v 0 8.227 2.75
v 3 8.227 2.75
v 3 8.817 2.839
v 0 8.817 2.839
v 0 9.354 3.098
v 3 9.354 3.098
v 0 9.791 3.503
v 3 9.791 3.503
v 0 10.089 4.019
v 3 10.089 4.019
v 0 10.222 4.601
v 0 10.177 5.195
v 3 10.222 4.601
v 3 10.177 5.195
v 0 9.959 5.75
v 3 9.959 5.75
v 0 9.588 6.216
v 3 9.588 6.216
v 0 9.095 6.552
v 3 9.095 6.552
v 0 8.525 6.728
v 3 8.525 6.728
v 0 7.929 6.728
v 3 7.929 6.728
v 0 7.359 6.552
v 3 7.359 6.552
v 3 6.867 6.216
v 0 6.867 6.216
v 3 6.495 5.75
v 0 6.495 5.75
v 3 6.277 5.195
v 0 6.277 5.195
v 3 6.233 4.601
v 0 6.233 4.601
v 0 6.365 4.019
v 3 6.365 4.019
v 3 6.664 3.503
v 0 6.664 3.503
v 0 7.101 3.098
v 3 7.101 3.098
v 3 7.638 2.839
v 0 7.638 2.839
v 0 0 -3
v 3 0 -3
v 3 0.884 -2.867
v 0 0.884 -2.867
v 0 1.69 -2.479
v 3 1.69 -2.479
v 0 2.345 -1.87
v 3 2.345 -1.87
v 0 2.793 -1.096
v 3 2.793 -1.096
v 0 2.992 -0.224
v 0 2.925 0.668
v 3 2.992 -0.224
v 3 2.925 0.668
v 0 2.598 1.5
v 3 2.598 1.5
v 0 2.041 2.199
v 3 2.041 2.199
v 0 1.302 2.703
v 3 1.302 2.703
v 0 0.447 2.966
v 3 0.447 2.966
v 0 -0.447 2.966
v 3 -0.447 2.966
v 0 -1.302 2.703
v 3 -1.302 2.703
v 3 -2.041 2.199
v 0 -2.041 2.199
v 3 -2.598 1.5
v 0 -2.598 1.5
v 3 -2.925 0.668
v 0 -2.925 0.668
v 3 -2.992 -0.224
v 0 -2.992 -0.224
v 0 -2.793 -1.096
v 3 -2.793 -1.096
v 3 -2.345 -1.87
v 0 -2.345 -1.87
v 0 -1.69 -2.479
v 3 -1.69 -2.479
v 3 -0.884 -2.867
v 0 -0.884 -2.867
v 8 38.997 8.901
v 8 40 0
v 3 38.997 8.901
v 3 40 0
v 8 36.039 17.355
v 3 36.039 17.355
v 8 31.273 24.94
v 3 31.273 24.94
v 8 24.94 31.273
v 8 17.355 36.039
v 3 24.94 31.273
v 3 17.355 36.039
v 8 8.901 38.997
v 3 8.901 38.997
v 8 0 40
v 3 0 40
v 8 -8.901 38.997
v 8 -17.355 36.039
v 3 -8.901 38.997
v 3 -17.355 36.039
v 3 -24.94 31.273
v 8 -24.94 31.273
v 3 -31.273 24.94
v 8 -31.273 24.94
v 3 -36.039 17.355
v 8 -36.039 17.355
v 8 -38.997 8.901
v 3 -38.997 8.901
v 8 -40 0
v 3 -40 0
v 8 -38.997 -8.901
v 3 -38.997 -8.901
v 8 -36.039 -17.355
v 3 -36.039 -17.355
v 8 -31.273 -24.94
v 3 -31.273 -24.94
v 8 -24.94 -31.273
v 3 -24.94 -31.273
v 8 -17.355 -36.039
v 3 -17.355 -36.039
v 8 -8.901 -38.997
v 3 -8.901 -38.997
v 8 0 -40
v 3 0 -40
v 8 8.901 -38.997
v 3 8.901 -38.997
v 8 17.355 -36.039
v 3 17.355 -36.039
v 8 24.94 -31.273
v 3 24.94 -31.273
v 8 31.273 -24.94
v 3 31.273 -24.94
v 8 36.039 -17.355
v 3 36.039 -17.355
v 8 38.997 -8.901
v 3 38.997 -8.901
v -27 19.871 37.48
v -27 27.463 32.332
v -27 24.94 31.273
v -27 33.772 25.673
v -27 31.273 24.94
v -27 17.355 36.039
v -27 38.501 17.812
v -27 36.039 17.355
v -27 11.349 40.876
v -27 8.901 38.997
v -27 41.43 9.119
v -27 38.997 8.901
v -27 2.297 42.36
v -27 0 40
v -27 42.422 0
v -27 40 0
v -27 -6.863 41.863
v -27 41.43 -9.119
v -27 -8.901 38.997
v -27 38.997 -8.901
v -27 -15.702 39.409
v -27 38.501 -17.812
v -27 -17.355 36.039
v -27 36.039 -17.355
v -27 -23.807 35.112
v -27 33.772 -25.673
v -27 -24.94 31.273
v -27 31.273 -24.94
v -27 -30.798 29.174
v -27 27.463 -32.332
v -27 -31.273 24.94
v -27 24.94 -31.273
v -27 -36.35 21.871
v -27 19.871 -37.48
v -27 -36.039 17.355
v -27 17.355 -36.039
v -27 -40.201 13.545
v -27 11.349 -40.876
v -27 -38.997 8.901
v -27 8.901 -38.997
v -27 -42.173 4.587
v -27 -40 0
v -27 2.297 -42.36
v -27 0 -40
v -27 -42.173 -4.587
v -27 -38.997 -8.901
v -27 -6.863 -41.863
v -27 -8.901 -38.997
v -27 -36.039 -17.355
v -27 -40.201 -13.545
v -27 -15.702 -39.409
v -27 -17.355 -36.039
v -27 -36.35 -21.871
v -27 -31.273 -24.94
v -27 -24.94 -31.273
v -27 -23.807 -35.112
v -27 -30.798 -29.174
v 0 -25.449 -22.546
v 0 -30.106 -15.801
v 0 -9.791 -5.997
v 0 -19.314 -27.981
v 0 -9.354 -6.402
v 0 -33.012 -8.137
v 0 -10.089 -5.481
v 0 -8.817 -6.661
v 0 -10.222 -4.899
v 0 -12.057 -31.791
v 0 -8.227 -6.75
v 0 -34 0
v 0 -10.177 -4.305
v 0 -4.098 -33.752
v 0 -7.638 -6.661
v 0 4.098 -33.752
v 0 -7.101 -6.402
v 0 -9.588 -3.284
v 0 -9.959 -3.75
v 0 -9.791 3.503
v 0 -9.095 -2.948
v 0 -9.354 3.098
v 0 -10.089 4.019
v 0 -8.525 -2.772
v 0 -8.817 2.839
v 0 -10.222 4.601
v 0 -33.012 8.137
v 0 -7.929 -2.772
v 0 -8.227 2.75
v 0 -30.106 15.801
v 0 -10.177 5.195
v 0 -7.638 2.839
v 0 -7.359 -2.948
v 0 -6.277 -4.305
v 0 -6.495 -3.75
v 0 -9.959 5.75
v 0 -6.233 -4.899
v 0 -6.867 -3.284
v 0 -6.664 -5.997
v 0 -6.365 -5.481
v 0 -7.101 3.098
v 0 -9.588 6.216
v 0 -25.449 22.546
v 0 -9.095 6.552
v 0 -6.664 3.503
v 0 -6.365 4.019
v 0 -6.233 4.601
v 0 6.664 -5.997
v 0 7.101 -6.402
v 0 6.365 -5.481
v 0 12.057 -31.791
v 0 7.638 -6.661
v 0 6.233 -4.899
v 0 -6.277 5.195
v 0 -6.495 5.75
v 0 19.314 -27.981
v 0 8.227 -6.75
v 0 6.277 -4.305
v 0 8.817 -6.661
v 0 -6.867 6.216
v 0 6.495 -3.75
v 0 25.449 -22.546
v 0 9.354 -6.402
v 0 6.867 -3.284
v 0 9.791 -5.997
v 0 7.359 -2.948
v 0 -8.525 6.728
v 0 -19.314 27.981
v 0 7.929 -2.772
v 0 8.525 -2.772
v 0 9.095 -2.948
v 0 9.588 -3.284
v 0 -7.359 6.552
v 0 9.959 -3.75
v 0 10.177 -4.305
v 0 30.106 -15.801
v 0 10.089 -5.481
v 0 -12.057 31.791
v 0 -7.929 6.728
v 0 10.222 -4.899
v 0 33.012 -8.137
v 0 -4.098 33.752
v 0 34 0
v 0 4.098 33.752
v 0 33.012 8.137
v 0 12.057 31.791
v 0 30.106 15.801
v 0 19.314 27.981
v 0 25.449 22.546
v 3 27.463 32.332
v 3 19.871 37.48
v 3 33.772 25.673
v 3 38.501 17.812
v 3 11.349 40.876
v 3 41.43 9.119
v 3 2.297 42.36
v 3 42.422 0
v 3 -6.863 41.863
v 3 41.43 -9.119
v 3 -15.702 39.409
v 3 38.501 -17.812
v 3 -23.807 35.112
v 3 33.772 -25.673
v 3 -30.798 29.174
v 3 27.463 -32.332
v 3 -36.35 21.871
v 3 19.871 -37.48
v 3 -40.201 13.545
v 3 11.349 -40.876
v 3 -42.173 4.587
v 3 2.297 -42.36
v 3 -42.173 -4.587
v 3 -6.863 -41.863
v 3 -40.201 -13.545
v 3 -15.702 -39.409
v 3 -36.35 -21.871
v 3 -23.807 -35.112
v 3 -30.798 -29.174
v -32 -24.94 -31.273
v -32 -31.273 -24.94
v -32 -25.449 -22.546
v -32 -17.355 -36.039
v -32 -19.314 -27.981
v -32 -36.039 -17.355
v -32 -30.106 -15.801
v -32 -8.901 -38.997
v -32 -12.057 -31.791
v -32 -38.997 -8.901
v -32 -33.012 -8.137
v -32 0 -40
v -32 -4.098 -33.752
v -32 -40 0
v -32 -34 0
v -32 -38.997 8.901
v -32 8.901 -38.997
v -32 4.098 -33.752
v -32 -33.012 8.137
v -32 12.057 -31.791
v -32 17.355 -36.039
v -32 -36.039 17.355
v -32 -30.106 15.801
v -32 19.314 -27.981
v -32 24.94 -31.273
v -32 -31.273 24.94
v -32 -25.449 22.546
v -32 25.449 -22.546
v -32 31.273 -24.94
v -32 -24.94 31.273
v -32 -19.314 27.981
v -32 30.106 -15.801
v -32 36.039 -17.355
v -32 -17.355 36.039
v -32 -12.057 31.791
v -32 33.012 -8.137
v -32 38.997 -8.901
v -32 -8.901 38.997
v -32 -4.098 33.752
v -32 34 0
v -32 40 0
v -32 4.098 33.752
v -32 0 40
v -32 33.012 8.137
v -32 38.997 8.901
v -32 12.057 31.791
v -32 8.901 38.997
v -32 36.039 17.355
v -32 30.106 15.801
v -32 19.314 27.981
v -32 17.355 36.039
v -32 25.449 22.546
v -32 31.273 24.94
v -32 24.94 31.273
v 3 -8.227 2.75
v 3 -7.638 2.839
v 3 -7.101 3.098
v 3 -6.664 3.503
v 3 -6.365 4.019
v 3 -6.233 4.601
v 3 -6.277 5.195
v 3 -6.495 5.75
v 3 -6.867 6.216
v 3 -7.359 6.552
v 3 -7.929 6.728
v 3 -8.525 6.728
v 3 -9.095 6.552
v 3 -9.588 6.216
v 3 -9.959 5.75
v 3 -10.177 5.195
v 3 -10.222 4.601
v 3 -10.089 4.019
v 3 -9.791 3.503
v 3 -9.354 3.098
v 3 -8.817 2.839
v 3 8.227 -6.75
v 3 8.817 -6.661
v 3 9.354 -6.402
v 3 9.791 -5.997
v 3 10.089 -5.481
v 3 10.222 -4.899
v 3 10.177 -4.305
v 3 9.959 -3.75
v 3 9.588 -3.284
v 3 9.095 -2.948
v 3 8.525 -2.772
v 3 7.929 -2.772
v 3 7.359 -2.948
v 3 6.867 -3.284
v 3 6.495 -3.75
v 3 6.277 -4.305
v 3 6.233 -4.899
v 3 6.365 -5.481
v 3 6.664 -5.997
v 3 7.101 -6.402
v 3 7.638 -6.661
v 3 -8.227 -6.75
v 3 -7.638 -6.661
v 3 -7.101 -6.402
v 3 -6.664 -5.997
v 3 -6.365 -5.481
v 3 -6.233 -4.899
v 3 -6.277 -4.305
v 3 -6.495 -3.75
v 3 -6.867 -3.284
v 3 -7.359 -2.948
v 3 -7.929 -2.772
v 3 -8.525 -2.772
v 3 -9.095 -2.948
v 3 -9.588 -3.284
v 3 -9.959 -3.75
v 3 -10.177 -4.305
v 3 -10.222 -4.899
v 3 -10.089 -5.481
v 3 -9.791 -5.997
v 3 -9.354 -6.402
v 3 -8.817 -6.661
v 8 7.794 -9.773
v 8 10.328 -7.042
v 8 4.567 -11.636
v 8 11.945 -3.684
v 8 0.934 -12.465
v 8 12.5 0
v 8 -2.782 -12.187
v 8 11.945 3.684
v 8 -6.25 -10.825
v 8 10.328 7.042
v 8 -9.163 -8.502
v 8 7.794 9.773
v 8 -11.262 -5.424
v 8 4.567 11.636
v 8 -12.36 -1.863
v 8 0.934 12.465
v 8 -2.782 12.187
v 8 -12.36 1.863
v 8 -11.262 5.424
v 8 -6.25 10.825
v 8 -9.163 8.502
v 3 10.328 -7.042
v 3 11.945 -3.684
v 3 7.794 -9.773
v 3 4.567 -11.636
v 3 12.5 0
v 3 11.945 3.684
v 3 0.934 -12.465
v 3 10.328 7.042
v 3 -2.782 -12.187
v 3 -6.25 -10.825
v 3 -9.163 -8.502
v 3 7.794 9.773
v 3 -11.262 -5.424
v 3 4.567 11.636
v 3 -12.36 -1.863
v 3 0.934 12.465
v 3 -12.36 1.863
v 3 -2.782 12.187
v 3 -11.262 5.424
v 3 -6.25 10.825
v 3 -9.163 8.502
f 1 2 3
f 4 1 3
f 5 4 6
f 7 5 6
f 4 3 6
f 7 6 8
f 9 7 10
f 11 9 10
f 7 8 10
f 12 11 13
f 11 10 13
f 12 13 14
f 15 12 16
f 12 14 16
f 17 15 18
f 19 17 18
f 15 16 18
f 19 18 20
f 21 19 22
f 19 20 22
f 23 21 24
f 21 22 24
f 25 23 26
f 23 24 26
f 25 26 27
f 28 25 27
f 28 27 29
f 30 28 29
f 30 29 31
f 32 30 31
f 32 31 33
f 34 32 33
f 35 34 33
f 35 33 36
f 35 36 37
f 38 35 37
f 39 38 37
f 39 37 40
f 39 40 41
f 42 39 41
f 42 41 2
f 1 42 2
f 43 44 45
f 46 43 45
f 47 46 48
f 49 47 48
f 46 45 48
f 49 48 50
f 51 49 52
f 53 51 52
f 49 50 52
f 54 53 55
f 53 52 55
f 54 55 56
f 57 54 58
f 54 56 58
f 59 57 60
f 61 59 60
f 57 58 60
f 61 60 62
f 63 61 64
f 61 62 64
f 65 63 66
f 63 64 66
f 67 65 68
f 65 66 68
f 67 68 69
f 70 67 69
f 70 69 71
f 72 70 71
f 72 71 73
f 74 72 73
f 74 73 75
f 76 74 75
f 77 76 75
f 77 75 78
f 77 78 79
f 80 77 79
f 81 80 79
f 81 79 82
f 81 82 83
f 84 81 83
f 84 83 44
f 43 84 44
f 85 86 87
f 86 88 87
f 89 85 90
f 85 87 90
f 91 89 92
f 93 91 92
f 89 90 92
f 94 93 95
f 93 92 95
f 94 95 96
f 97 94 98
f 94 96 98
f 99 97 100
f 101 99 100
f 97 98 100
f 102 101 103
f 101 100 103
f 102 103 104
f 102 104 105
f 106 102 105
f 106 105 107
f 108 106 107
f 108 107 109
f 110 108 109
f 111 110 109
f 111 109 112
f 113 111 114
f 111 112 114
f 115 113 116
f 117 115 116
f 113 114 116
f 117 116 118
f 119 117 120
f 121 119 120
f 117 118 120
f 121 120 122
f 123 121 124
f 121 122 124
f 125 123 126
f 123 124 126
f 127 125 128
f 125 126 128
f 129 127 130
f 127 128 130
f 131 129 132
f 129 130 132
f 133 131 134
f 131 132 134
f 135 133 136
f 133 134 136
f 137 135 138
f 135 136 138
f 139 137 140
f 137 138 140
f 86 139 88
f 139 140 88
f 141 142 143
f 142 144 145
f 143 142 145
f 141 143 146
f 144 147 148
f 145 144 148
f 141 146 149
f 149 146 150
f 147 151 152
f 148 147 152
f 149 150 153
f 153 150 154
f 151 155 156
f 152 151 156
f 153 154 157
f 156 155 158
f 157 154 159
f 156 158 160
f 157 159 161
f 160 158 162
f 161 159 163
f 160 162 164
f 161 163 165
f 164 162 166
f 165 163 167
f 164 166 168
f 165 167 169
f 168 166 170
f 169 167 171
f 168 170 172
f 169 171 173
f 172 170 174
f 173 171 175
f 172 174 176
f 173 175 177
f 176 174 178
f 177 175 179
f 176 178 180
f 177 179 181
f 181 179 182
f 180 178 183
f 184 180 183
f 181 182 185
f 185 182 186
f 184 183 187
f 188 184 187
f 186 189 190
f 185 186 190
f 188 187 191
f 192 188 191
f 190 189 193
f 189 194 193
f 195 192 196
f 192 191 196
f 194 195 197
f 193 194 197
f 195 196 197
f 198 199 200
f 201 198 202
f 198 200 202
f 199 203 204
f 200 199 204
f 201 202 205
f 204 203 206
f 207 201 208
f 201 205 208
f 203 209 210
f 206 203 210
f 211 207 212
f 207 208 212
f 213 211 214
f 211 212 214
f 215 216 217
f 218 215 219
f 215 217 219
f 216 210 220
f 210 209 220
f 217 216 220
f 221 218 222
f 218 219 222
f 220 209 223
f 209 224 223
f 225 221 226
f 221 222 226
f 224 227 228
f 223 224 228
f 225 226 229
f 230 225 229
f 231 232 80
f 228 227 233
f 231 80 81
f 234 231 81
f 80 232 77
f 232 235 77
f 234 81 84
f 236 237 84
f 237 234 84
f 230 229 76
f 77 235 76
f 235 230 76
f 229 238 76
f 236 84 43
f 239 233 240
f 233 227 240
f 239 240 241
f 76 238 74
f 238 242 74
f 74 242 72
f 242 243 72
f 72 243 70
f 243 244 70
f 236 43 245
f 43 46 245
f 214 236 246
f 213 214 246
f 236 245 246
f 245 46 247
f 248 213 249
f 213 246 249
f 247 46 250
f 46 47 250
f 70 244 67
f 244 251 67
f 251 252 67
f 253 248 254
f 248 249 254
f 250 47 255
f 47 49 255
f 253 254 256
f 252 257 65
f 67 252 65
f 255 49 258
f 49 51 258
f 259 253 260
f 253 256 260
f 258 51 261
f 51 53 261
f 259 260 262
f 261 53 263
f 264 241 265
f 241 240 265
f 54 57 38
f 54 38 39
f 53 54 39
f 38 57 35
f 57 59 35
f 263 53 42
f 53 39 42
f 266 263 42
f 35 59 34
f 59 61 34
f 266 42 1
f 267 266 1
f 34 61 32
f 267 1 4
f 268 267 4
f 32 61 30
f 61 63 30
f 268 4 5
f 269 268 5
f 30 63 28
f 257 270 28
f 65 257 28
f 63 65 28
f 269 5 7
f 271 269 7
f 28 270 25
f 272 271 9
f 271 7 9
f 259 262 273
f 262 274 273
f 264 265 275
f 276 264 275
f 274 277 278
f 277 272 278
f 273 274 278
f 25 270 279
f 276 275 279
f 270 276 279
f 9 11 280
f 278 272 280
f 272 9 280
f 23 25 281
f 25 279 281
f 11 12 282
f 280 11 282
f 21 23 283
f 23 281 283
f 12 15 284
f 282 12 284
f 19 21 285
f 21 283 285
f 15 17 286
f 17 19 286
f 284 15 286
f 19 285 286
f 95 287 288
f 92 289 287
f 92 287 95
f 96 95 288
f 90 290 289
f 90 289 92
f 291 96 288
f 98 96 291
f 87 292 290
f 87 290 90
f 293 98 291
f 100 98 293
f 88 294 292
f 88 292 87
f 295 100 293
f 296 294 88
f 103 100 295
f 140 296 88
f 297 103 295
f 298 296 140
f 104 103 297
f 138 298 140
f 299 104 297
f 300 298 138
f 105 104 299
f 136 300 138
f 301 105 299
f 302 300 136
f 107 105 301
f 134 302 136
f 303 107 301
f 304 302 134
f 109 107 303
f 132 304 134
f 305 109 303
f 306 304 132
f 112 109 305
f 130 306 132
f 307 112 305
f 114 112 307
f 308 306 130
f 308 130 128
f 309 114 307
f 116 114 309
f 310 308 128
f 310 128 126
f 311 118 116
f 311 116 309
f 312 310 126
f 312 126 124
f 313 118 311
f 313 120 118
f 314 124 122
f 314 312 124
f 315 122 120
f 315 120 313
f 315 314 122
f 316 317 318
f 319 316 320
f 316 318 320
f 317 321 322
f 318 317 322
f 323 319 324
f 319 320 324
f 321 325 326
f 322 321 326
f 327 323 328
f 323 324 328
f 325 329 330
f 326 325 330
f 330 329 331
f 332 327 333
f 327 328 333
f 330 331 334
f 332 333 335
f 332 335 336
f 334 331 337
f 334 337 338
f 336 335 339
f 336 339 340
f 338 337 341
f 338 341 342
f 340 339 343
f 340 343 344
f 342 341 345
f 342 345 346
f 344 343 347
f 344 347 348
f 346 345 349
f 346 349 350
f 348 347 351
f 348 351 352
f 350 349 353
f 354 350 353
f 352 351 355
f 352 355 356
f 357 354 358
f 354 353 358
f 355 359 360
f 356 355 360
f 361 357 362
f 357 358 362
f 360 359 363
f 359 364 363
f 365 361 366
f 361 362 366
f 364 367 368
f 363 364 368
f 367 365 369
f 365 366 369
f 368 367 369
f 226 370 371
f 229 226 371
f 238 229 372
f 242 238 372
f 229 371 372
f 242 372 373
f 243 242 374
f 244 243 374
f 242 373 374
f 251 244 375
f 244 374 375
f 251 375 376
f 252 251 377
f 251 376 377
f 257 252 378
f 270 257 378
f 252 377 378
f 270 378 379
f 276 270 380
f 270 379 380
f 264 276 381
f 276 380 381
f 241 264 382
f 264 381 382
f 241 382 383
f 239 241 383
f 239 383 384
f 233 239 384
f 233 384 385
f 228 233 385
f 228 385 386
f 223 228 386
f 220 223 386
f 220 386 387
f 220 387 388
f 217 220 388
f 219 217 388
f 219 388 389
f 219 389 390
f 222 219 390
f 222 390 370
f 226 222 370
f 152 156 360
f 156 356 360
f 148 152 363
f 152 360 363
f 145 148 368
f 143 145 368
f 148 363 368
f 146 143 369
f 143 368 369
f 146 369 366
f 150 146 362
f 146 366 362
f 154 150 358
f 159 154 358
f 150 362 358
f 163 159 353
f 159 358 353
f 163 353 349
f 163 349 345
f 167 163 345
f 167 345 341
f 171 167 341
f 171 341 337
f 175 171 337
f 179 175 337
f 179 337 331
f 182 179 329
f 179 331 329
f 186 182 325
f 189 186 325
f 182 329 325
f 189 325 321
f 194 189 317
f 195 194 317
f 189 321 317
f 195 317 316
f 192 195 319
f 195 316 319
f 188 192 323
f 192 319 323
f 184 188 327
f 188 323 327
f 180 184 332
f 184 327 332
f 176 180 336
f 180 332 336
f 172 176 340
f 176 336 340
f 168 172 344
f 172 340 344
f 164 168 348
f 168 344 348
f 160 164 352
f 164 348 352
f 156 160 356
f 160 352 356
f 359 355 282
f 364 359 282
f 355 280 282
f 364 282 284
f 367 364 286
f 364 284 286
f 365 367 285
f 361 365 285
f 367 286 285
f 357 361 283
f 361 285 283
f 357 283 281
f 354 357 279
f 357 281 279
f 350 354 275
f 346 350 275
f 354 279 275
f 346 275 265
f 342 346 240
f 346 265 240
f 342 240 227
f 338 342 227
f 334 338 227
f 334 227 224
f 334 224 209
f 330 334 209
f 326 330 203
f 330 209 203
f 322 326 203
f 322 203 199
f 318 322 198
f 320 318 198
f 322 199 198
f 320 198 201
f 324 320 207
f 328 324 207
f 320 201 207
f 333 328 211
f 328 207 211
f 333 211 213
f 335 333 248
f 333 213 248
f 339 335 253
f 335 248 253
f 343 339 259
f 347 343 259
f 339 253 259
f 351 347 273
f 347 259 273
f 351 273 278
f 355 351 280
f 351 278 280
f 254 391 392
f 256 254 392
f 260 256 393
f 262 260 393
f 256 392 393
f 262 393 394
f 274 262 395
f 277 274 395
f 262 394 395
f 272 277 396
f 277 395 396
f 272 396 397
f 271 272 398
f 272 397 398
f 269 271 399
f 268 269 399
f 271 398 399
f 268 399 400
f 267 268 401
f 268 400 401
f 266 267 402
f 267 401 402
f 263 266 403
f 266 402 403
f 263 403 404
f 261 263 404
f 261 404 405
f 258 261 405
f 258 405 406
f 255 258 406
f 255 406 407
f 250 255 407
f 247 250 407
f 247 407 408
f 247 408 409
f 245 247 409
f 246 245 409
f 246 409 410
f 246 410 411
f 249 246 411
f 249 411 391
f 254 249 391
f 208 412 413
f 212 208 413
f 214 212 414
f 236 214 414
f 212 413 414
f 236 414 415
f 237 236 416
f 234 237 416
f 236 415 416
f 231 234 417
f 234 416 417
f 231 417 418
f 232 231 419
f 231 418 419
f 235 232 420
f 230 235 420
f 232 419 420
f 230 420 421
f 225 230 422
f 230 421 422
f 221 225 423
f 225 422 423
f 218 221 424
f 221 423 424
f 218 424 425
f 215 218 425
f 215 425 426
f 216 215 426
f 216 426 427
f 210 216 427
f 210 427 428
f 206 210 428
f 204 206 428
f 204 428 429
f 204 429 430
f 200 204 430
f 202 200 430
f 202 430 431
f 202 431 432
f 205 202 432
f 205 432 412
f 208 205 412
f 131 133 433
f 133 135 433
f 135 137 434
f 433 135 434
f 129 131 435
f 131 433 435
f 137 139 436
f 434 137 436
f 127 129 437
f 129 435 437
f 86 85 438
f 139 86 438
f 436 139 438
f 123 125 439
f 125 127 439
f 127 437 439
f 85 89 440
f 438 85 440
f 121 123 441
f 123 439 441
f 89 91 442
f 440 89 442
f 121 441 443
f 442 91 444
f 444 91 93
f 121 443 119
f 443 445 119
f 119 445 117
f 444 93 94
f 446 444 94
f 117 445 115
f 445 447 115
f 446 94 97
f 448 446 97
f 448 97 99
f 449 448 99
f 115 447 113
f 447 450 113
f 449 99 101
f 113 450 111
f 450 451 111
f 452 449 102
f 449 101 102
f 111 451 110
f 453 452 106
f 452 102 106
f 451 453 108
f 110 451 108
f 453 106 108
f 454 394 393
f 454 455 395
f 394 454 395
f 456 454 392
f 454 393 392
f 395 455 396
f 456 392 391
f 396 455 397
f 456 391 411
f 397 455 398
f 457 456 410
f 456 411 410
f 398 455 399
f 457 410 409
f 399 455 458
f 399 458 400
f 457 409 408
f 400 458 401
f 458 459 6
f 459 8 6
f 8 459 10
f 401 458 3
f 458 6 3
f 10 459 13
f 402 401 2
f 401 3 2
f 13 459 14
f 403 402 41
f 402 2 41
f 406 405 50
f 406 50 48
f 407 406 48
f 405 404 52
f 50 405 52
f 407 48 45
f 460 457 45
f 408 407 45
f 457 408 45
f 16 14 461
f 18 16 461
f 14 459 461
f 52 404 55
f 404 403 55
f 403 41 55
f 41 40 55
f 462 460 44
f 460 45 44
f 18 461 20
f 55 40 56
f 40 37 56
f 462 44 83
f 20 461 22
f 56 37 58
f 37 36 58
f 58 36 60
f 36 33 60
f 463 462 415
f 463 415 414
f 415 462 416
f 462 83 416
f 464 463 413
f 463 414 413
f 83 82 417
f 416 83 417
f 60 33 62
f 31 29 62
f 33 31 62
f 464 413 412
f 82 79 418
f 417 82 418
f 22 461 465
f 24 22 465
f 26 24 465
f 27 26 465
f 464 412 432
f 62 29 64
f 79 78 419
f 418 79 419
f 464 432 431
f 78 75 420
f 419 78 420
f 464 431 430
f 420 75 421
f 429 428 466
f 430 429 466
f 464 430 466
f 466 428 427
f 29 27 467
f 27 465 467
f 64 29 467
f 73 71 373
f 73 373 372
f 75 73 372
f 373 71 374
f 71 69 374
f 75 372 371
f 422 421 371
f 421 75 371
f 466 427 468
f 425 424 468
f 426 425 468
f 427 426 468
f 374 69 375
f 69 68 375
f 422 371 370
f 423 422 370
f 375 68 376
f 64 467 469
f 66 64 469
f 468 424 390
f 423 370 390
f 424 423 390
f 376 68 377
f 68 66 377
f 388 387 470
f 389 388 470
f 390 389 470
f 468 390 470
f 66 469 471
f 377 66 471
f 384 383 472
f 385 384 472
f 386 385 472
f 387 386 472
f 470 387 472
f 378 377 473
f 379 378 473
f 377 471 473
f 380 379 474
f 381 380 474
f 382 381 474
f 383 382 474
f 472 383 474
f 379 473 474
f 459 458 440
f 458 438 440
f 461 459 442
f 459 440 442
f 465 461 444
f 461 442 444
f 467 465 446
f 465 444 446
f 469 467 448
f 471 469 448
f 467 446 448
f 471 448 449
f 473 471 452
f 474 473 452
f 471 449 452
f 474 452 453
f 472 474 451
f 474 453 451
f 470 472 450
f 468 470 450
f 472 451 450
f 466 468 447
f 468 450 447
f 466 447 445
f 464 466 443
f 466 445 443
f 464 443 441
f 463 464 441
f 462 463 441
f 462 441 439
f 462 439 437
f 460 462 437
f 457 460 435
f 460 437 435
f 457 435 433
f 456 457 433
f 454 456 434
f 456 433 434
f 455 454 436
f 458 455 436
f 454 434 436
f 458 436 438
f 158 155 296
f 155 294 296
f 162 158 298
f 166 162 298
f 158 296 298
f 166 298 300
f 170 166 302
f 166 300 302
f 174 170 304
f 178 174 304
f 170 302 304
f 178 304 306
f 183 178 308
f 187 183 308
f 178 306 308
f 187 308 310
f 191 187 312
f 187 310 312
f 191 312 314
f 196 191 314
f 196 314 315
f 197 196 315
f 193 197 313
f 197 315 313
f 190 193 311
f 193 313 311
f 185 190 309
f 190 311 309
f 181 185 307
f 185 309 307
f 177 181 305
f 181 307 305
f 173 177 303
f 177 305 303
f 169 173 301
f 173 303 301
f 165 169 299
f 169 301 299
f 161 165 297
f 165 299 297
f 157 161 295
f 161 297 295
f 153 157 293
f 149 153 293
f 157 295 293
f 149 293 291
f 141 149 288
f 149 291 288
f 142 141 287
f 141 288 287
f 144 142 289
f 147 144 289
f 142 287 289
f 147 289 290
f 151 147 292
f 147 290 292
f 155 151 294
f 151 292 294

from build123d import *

# Parameters (mm, degrees)
ESQUISSE2_W             = 5
ESQUISSE2_H             = 12.5
ESQUISSE3_R             = 2
ENL_V_MAT_EXTRU_1_DEPTH = 36
ESQUISSE4_R             = 3
ENL_V_MAT_EXTRU_2_DEPTH = 36
ESQUISSE5_W             = 30
ESQUISSE5_H             = 3.421913798


with BuildPart() as part:
    # Esquisse1 → Révolution1 (revolve)
    with BuildSketch(Plane.XY):
        Polygon((0, 34), (0, 0), (8, 0), (8, 40), (3, 40), (3, 39), (-27, 39), (-27, 40), (-32, 40), (-32, 34), align=None)
    revolve(axis=Axis((-49.644499027, 0, 0), (1, 0, 0)))

    # Esquisse2 → Enlèvement de matière-Révolution1 (revolve, cut)
    with BuildSketch(Plane.XY):
        with Locations((5.5, 6.25)):
            Rectangle(ESQUISSE2_W, ESQUISSE2_H)
    revolve(axis=Axis((0, 0, 0), (1, 0, 0)), mode=Mode.SUBTRACT)

    # Esquisse3 → Enlèv. mat.-Extru.1 (cut, through all)
    with BuildSketch(Plane(origin=(3, 0, 0), x_dir=(0, 0, -1), z_dir=(1, 0, 0))):
        with Locations((4.75, 8.227241336)):
            Circle(ESQUISSE3_R)
        with Locations((-4.75, 8.227241336)):
            Circle(ESQUISSE3_R)
        with Locations((4.75, -8.227241336)):
            Circle(ESQUISSE3_R)
        with Locations((-4.75, -8.227241336)):
            Circle(ESQUISSE3_R)
    extrude(amount=-ENL_V_MAT_EXTRU_1_DEPTH, mode=Mode.SUBTRACT)

    # Esquisse4 → Enlèv. mat.-Extru.2 (cut, through all)
    with BuildSketch(Plane(origin=(3, 0, 0), x_dir=(0, 0, -1), z_dir=(1, 0, 0))):
        Circle(ESQUISSE4_R)
    extrude(amount=-ENL_V_MAT_EXTRU_2_DEPTH, mode=Mode.SUBTRACT)

    # Esquisse5 → Révolution2 (revolve)
    with BuildSketch(Plane.XY):
        with Locations((-12, 40.710956899)):
            Rectangle(ESQUISSE5_W, ESQUISSE5_H)
    revolve(axis=Axis((0, 0, 0), (-1, 0, 0)))


solid = part.part
